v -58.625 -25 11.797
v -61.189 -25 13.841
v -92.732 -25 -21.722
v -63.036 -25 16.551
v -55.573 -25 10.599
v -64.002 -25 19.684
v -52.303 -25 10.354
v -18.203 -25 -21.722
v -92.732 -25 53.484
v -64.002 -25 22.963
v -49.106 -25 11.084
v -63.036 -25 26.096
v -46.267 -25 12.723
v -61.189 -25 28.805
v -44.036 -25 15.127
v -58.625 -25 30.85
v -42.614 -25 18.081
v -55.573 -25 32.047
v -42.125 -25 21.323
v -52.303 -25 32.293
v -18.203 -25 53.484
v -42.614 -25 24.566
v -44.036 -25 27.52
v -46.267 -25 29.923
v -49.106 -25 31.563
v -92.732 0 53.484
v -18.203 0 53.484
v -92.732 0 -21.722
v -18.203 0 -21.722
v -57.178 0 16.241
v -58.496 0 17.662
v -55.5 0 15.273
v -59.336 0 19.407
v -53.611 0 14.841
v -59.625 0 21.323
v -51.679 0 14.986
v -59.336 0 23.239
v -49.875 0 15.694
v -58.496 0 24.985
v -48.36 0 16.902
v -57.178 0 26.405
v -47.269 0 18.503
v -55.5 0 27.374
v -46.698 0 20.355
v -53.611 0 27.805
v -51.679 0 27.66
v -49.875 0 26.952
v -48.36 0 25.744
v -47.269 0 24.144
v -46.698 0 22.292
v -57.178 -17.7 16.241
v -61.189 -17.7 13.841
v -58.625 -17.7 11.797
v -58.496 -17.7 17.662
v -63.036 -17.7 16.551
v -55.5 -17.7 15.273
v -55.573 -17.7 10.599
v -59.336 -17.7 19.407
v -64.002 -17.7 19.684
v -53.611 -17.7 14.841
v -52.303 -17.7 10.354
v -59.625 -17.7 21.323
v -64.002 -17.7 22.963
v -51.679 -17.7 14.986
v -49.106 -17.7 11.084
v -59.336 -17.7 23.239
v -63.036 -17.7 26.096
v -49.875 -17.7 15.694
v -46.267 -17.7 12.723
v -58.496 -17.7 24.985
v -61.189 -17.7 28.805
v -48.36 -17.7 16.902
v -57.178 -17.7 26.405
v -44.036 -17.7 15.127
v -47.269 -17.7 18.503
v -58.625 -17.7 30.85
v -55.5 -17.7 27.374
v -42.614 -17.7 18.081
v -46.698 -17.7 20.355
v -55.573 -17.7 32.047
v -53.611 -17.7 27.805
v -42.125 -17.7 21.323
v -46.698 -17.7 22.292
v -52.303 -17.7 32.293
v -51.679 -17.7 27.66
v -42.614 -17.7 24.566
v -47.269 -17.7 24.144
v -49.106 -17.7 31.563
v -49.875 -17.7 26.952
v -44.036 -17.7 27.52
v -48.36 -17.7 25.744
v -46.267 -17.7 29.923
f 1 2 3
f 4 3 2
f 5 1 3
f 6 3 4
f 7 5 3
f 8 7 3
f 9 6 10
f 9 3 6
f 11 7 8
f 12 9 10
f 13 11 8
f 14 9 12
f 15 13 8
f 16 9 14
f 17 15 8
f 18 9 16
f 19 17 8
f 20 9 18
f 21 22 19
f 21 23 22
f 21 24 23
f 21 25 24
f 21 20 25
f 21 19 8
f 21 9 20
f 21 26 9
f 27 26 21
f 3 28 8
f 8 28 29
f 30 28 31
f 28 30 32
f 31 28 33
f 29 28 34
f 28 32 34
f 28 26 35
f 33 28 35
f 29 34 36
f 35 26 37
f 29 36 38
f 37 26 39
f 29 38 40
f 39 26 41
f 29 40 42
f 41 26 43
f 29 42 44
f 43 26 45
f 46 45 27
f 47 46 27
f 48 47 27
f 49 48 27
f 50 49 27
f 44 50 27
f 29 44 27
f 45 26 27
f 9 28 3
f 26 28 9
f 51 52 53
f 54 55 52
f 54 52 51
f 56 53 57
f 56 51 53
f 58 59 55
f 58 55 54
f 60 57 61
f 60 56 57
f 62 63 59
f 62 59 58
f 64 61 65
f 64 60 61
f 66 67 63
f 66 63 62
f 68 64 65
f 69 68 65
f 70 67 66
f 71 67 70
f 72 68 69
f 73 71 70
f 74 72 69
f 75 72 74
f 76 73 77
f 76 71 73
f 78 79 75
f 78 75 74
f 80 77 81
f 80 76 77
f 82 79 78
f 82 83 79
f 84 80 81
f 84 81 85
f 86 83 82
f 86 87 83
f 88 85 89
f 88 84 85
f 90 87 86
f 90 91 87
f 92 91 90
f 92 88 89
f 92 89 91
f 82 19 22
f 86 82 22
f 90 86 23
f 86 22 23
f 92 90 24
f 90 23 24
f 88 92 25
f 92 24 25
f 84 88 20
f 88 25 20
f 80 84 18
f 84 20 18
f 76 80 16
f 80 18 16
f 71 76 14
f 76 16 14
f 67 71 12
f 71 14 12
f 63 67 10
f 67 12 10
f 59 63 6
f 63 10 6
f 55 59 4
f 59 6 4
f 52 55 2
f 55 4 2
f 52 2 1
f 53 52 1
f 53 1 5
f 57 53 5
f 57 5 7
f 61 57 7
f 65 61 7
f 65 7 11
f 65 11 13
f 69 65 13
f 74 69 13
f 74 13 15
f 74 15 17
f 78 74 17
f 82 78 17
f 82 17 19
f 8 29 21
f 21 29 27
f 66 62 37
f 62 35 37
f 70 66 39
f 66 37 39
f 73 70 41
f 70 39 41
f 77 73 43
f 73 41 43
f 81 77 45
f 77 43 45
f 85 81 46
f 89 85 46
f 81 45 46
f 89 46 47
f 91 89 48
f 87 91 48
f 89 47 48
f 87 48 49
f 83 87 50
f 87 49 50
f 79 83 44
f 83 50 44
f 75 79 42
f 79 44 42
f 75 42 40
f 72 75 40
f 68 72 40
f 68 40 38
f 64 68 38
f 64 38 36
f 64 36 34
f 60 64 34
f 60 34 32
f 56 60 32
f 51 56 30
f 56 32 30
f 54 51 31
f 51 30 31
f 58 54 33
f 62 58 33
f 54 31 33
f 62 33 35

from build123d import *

# Parameters (mm, degrees)
F0_W           = 74.5297018439
F0_H           = 75.2062629908
F1_DEPTH       = 25
F6_D           = 13
F6_DEPTH       = 50
F6_CBORE_D     = 22
F6_CBORE_DEPTH = 7.3
F6_TIP         = 3.9055940237


# Not quite as in the source:
# - the program builds the solid bodies; features that only make, move or delete a surface that nothing else refers to are left out


with BuildPart() as f1:
    # F0 (on Front) → F1 (new body)
    with BuildSketch(Plane.XZ):
        with Locations((-55.4675785825, 15.8807532862)):
            Rectangle(F0_W, F0_H)
    extrude(amount=F1_DEPTH)

    # F6
    with Locations(Plane.XZ.offset(25)):
        with Locations((-53.1250275671, 21.3232878596)):
            CounterBoreHole(F6_D / 2, F6_CBORE_D / 2, F6_CBORE_DEPTH, depth=F6_DEPTH)
            with Locations((0, 0, -(F6_DEPTH + F6_TIP / 2))):  # 118° drill point
                Cone(0, F6_D / 2, F6_TIP, mode=Mode.SUBTRACT)


solid = f1.part
